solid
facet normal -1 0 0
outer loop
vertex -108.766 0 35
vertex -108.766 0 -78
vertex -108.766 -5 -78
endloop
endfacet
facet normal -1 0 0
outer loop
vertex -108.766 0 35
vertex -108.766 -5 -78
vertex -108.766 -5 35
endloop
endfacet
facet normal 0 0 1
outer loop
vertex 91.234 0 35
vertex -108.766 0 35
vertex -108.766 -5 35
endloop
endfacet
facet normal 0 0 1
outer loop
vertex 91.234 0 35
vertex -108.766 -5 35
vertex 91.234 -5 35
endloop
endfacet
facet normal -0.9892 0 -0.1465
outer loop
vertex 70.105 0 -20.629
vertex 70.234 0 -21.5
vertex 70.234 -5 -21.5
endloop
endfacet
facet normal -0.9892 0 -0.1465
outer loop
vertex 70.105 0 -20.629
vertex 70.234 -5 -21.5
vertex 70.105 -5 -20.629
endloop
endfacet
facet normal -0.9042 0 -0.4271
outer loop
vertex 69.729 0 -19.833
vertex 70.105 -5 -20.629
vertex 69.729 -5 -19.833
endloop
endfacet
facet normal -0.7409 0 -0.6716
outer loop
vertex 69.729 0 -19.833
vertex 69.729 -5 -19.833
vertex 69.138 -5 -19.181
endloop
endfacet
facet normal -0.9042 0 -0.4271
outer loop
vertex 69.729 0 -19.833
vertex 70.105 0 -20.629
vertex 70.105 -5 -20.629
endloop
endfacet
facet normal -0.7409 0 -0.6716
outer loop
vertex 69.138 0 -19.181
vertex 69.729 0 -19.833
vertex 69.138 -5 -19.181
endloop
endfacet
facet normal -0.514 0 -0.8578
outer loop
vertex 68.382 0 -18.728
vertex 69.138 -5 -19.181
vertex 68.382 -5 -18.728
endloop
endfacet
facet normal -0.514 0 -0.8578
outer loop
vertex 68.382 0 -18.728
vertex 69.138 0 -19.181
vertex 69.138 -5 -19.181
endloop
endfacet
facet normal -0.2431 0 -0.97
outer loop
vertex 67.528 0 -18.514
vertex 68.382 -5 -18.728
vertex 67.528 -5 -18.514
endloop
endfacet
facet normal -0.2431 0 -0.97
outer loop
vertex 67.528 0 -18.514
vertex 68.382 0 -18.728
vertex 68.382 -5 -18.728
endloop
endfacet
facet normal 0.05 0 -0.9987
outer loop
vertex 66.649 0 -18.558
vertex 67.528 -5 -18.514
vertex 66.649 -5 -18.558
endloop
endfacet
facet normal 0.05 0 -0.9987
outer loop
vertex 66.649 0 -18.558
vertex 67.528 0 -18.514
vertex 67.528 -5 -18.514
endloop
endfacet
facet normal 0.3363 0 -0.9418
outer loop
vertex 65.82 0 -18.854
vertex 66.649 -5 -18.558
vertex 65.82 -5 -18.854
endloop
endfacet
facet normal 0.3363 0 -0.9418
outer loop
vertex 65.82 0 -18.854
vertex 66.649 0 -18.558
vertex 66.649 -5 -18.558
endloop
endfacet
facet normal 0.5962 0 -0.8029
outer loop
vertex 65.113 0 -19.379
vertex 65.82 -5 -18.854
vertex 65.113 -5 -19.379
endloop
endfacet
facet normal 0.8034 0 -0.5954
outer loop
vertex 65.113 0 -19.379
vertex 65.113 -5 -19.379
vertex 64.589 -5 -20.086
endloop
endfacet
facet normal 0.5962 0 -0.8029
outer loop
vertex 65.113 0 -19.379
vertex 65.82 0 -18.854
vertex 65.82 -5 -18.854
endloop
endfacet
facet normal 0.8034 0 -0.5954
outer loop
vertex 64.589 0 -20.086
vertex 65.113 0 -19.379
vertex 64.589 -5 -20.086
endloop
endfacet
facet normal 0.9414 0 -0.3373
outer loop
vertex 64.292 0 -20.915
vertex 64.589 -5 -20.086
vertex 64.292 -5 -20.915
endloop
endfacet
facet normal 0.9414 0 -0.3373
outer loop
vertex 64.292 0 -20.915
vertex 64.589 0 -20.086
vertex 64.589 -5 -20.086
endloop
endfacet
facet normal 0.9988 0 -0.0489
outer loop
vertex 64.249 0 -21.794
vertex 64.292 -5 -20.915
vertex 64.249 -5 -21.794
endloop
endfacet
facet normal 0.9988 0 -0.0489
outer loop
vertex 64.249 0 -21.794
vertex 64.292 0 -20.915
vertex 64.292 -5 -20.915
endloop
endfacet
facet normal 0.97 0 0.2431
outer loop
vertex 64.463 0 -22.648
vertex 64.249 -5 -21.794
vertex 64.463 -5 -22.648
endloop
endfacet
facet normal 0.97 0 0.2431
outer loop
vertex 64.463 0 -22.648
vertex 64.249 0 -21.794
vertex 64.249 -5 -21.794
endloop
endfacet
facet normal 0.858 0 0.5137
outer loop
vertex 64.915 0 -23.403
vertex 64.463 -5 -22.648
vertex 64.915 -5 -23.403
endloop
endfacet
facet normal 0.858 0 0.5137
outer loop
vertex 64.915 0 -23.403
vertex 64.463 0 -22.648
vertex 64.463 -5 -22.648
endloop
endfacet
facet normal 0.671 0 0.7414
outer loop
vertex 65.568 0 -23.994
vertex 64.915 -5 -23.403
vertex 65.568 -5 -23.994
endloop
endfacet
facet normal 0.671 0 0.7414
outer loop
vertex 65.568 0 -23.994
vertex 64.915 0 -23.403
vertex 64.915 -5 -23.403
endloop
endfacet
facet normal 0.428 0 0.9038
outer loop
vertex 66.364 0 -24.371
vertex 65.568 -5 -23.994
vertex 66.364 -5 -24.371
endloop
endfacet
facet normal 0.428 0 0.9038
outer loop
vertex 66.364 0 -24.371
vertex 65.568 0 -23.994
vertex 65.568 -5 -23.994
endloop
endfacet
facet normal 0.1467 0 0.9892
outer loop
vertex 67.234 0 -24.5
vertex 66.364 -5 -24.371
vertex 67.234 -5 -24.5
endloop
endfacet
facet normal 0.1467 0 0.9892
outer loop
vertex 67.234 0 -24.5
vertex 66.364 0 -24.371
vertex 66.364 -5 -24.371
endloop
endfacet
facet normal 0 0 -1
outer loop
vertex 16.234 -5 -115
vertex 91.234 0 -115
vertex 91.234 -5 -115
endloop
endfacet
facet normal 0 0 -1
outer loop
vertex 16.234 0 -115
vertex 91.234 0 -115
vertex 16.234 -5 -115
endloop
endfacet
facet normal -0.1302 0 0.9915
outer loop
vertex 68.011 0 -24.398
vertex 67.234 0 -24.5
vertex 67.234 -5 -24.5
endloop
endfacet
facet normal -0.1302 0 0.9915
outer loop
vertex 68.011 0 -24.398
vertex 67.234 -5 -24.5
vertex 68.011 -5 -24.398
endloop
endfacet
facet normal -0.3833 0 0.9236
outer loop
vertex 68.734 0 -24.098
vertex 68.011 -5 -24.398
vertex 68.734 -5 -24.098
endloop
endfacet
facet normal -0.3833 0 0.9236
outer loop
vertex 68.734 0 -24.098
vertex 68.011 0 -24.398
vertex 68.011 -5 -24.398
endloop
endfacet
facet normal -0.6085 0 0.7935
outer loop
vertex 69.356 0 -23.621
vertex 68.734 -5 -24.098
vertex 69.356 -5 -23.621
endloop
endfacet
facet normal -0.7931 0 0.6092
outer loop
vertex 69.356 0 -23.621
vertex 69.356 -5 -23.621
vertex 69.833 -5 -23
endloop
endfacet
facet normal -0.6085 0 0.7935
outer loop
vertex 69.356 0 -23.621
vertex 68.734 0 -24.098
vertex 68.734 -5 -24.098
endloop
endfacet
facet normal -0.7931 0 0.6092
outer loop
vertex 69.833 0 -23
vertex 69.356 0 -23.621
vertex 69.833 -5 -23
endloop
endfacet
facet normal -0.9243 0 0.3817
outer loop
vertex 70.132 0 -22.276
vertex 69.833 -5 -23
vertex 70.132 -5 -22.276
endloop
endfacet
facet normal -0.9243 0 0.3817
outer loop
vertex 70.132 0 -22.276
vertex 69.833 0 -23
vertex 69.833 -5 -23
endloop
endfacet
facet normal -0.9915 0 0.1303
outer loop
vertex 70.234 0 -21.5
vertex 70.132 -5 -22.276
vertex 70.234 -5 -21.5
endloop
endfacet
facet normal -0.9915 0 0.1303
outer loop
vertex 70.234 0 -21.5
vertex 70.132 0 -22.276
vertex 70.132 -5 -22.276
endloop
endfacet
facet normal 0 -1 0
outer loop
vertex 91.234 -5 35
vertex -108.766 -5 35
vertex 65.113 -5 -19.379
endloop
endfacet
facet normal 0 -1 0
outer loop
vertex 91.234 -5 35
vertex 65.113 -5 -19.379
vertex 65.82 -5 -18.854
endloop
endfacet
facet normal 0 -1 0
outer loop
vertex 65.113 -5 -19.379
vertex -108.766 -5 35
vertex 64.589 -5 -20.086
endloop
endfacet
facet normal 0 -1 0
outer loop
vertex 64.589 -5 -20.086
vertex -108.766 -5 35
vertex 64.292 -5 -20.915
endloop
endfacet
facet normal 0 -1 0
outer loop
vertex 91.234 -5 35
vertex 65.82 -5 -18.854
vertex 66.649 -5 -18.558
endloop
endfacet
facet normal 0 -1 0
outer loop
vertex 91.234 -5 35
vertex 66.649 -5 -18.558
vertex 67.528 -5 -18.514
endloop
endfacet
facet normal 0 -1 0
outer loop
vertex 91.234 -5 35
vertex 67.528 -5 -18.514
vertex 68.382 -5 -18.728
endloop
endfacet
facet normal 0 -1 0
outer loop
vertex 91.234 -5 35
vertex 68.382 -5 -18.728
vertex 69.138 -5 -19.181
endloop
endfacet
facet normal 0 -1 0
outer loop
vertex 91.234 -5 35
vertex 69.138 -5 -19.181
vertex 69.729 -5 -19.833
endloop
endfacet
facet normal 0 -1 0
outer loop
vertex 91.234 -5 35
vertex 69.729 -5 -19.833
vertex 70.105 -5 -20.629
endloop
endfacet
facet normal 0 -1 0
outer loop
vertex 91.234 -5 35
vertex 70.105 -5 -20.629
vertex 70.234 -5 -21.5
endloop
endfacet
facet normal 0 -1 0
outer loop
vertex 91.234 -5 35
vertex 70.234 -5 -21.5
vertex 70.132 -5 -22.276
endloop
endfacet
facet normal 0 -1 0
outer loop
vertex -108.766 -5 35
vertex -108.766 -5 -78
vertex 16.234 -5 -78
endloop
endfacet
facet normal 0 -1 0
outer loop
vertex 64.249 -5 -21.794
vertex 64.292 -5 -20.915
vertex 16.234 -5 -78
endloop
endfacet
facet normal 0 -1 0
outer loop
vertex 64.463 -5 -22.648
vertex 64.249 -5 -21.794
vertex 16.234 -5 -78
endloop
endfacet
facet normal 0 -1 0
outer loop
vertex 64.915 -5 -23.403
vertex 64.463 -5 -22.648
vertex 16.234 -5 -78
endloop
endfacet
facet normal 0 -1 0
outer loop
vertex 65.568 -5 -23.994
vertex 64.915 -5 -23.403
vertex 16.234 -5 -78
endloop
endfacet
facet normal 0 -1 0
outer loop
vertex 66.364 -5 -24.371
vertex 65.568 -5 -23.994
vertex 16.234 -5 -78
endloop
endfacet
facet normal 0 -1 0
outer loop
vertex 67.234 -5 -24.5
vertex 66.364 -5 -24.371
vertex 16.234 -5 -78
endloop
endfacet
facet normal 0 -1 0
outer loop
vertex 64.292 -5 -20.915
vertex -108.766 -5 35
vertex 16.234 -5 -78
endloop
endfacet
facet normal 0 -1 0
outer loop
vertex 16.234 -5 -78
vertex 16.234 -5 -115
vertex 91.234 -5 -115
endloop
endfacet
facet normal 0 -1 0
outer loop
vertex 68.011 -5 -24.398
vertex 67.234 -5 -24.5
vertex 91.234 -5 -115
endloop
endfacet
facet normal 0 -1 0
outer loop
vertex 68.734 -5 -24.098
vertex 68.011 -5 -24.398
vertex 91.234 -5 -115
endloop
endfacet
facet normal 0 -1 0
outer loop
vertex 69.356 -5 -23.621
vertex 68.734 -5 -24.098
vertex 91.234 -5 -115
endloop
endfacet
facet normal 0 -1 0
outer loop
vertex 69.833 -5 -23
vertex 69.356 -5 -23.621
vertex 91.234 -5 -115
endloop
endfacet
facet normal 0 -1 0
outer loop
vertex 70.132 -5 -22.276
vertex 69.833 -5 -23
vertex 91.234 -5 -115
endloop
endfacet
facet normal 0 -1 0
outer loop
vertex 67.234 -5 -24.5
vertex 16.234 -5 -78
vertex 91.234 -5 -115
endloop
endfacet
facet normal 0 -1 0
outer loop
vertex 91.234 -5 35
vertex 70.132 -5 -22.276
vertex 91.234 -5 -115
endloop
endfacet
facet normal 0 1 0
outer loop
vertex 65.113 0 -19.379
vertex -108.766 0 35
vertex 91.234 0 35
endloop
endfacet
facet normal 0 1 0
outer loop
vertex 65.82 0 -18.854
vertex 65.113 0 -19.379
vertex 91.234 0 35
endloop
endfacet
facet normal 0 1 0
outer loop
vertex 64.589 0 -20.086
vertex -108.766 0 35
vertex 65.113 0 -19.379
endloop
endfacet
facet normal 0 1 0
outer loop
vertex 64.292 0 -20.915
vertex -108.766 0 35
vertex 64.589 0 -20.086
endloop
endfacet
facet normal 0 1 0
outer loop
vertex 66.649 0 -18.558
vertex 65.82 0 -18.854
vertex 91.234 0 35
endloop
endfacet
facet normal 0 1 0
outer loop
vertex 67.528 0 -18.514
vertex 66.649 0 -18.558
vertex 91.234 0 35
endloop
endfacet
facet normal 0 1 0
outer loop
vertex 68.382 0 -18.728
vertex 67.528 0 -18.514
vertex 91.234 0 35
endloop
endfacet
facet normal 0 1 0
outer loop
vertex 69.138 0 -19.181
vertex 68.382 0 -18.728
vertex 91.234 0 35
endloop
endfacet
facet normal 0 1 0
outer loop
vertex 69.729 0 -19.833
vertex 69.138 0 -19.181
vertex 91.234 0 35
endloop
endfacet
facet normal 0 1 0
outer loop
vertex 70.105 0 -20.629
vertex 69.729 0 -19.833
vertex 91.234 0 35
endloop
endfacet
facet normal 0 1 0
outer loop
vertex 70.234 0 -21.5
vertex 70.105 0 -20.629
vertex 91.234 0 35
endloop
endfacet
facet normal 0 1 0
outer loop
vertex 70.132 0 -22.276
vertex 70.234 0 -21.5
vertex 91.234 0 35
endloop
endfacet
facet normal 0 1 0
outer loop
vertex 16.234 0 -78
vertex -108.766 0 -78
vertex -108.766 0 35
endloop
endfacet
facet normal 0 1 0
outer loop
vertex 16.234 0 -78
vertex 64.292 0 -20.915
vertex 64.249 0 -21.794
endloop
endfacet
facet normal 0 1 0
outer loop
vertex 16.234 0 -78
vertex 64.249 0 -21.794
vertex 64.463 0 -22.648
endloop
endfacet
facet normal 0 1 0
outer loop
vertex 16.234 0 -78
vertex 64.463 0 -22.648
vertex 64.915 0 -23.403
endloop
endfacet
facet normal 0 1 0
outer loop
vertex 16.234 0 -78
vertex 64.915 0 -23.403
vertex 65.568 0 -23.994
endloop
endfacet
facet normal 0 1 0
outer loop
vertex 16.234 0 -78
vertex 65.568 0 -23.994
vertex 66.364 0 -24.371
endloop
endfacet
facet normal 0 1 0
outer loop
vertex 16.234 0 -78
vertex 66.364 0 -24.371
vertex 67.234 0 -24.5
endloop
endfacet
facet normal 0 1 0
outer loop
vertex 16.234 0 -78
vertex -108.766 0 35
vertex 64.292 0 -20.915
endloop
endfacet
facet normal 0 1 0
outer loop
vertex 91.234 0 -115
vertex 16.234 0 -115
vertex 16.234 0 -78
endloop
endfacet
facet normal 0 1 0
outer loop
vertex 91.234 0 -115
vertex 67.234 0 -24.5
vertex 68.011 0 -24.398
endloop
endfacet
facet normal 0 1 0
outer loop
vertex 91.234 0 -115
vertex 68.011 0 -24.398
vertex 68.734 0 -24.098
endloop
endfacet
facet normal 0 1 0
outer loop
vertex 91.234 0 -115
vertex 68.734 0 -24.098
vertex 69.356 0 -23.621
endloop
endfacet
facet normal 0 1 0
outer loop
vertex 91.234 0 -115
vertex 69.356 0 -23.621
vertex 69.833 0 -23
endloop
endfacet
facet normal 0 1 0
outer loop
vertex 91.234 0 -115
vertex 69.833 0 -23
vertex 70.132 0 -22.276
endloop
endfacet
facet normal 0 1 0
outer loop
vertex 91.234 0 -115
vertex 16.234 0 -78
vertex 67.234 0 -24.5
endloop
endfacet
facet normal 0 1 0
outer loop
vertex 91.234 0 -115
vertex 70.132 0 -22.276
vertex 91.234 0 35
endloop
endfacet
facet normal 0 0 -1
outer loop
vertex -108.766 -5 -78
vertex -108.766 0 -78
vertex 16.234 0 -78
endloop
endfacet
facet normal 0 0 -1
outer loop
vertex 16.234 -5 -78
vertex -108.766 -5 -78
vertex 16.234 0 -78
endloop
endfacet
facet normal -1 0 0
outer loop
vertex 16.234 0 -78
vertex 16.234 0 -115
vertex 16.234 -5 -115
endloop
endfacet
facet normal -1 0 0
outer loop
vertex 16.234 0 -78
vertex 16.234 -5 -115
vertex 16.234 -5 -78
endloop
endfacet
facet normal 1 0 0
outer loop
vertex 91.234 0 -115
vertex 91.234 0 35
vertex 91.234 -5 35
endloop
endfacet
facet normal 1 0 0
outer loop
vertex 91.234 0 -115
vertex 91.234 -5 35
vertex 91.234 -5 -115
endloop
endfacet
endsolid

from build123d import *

# Parameters (mm, degrees)
SZKIC1_W                    = 200
SZKIC1_H                    = 5
SZKIC1_W_2                  = 46
SZKIC1_H_2                  = 37
SZKIC1_W_3                  = 24
SZKIC1_W_4                  = 125
DODANIE_WYCI_GNI_CIE1_DEPTH = 5


with BuildPart() as part:
    # Szkic1 → Dodanie-wyciągnięcie1 (new body)
    with BuildSketch(Plane(origin=(0, 0, 0), x_dir=(1, 0, 0), z_dir=(0, 1, 0))):
        with Locations((-8.765553919, -32.5)):
            Rectangle(SZKIC1_W, SZKIC1_H)
        with Locations((44.234446081, 91.5)):
            Rectangle(SZKIC1_W_2, SZKIC1_H_2)
        with Locations((79.234446081, 91.5)):
            Rectangle(SZKIC1_W_3, SZKIC1_H_2)
        with Locations((-46.265553919, 75.5)):
            Rectangle(SZKIC1_W_4, SZKIC1_H)
        Polygon((16.234446081, 73), (21.234446081, 73), (21.234446081, 110), (21.234446081, 115), (16.234446081, 115), (16.234446081, 78), align=None)
        Polygon((67.234446081, 110), (91.234446081, 110), (91.234446081, 115), (21.234446081, 115), (21.234446081, 110), align=None)
        with BuildLine():
            Line((91.234446081, -30), (91.234446081, 21.5))
            Line((91.234446081, 21.5), (70.234446081, 21.5))
            ThreePointArc((70.234446081, 21.5), (65.113125737, 19.378679656), (67.234446081, 24.5))
            Line((67.234446081, 24.5), (67.234446081, 73))
            Line((67.234446081, 73), (21.234446081, 73))
            Line((21.234446081, 73), (16.234446081, 73))
            Line((16.234446081, 73), (-108.765553919, 73))
            Line((-108.765553919, 73), (-108.765553919, -30))
            Line((-108.765553919, -30), (91.234446081, -30))
        make_face()
        with BuildLine():
            Line((70.234446081, 21.5), (91.234446081, 21.5))
            Line((91.234446081, 21.5), (91.234446081, 73))
            Line((91.234446081, 73), (67.234446081, 73))
            Line((67.234446081, 73), (67.234446081, 24.5))
            ThreePointArc((67.234446081, 24.5), (69.355766424, 23.621320344), (70.234446081, 21.5))
        make_face()
    extrude(amount=-DODANIE_WYCI_GNI_CIE1_DEPTH)


solid = part.part
